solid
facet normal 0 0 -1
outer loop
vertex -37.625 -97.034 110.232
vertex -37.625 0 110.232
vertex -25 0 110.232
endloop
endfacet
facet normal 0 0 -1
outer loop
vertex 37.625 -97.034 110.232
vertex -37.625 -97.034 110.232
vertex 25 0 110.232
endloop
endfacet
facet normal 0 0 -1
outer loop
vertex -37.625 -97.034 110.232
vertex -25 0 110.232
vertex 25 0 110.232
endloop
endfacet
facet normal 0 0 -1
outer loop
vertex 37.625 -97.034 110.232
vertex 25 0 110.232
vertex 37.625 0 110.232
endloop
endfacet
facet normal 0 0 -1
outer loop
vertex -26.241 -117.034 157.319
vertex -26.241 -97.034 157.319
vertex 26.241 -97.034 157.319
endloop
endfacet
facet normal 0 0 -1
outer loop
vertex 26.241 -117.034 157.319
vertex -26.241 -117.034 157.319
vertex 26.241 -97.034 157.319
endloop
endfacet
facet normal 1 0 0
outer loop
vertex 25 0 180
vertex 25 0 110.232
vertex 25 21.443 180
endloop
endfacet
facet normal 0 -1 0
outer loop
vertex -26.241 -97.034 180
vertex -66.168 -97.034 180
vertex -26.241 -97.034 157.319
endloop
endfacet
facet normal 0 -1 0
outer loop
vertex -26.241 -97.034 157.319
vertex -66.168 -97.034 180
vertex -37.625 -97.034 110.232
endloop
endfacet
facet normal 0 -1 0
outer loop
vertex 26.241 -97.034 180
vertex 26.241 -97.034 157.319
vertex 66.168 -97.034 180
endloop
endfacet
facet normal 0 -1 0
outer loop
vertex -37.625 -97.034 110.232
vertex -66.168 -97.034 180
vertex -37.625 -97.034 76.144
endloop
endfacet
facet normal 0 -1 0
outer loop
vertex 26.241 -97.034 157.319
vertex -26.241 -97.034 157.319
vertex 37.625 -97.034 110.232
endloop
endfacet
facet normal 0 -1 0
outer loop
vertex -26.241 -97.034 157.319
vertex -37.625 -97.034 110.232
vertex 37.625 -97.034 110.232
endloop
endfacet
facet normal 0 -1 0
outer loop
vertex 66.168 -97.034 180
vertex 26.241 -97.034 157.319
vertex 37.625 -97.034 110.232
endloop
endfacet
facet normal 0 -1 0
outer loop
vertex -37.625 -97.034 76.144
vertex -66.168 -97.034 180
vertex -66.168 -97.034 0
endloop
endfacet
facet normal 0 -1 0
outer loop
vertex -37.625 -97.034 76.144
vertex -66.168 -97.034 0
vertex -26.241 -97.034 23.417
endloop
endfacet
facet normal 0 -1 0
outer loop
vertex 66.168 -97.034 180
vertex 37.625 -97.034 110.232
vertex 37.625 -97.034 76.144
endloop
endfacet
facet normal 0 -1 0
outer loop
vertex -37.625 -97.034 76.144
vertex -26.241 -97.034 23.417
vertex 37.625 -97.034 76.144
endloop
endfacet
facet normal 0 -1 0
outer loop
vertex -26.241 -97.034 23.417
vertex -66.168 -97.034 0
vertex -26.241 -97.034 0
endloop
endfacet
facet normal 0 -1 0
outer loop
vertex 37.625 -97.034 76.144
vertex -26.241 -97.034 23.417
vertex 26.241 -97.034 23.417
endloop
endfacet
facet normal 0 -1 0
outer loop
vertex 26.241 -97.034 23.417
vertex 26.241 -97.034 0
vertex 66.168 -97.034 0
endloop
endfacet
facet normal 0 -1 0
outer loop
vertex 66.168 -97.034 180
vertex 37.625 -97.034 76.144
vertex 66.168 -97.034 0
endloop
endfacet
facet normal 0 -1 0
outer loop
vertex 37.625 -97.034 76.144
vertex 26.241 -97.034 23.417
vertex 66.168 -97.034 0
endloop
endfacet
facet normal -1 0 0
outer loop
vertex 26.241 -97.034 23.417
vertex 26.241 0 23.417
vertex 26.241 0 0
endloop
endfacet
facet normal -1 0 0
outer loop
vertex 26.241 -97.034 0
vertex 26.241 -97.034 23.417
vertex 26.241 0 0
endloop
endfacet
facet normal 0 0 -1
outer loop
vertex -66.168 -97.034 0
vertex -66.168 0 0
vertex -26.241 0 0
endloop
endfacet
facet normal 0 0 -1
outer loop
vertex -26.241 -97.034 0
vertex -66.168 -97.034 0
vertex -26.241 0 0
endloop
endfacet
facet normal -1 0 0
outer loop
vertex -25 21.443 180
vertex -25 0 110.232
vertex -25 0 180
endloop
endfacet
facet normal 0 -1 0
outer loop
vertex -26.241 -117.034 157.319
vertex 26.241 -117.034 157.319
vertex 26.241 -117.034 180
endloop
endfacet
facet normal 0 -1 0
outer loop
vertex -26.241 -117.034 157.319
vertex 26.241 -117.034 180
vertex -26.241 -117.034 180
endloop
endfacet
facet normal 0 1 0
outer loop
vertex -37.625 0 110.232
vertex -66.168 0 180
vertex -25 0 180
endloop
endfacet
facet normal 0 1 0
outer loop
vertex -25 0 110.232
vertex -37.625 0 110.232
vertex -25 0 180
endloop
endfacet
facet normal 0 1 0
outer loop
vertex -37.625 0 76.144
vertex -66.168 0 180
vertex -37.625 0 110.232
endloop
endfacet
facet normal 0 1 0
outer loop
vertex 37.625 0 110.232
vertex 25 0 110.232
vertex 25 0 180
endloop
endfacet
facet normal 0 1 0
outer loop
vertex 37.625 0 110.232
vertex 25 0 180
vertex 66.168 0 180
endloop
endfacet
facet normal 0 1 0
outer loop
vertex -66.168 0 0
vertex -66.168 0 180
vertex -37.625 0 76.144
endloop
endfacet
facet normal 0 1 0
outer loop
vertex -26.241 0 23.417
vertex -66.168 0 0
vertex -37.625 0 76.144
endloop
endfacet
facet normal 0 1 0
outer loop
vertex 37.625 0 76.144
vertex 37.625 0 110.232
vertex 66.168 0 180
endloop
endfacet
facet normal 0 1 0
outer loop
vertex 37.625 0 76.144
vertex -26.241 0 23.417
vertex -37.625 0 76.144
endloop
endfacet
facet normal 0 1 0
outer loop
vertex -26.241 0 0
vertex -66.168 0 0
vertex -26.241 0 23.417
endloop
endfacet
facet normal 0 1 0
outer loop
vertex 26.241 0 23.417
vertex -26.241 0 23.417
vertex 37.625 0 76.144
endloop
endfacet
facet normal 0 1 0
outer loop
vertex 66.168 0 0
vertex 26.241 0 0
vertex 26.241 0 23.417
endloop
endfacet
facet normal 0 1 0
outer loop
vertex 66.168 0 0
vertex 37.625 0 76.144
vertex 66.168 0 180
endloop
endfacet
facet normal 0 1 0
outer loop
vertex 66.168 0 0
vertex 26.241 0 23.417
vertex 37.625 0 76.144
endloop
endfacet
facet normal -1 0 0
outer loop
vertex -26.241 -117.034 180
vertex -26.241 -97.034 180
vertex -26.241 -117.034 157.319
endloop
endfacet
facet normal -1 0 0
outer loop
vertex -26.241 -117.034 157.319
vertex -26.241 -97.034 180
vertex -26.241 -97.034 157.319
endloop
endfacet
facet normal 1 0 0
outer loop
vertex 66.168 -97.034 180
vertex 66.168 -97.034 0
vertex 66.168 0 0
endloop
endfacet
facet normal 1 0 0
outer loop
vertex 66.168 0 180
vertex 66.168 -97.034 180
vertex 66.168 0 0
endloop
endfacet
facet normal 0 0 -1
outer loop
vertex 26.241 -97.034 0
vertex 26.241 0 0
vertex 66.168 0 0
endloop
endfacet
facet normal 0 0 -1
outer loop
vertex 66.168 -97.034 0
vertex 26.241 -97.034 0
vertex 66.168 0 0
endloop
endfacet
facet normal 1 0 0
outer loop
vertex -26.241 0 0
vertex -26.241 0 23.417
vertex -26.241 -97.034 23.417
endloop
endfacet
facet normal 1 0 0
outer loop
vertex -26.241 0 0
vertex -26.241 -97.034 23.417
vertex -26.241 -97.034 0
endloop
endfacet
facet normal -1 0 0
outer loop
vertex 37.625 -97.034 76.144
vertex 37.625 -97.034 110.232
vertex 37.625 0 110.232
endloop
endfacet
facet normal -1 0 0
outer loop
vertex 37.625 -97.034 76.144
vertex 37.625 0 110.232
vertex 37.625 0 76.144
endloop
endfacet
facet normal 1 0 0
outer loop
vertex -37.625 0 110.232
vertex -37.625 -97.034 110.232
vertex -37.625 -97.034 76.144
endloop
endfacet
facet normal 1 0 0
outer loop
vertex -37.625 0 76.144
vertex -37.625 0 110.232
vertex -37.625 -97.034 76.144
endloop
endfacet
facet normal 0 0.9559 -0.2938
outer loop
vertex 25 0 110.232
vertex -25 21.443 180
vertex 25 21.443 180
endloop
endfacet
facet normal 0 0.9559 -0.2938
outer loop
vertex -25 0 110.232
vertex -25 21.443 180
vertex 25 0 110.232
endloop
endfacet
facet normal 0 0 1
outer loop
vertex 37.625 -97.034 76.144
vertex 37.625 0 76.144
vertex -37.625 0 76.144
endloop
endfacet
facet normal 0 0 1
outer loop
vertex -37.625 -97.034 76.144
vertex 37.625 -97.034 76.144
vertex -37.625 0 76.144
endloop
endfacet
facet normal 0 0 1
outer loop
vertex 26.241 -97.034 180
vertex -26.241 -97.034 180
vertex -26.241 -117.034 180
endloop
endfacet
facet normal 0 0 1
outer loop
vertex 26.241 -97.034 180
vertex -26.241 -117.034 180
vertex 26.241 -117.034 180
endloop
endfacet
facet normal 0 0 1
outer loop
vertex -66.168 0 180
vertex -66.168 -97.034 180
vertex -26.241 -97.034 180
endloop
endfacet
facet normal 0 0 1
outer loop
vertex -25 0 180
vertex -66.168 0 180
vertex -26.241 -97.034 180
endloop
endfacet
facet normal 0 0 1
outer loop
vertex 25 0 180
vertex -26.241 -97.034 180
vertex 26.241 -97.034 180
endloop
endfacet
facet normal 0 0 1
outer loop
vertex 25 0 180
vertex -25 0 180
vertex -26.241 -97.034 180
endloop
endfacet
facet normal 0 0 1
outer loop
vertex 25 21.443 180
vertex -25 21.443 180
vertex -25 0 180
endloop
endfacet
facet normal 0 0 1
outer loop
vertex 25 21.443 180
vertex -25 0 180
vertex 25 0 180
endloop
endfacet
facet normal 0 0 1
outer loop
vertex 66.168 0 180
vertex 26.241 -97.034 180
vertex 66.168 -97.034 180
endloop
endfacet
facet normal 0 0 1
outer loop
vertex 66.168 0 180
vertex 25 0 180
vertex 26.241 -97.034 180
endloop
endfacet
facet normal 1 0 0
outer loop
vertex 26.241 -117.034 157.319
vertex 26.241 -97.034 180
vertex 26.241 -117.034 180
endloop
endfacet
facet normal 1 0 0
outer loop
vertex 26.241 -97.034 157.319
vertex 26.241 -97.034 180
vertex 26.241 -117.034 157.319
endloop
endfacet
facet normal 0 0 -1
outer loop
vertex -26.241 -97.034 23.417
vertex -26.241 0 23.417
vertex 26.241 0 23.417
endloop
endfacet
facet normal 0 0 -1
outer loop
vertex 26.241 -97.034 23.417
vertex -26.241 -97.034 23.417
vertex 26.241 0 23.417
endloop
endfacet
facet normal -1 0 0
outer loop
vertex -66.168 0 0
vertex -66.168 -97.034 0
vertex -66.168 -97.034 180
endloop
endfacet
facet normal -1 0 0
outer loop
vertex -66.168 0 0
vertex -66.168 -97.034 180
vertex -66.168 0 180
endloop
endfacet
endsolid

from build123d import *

# Parameters (mm, degrees)
SKETCH_1_W           = 132.33692867
SKETCH_1_H           = 97.034055892
EXTRUDE_1_DEPTH      = 180
SKETCH_2_W           = 37.625025254
SKETCH_2_H           = 34.08860124
SKETCH_2_W_2         = 26.240865703
SKETCH_2_H_2         = 23.4168688
CUT_EXTRUDE_2_DEPTH  = 215.927601009
SKETCH_6_W           = 26.240865703
SKETCH_6_H           = 22.681143593
EXTRUDE_2_DEPTH      = 20
EXTRUDE_3_DEPTH      = 25
EXTRUDE_3_DEPTH_BACK = 25


with BuildPart() as part:
    # Эскиз1 → Бобышка-Вытянуть1 (new body)
    with BuildSketch(Plane.XY):
        with Locations((0, -48.517027946)):
            Rectangle(SKETCH_1_W, SKETCH_1_H)
    extrude(amount=EXTRUDE_1_DEPTH)

    # Эскиз2 → Вырез-Вытянуть2 (cut, through all)
    with BuildSketch(Plane(origin=(0, 0, 0), x_dir=(1, 0, 0), z_dir=(0, 1, 0))):
        with Locations((-18.812512627, -93.188142562)):
            Rectangle(SKETCH_2_W, SKETCH_2_H)
        with Locations((18.812512627, -93.188142562)):
            Rectangle(SKETCH_2_W, SKETCH_2_H)
        with Locations((13.120432852, -11.7084344)):
            Rectangle(SKETCH_2_W_2, SKETCH_2_H_2)
        with Locations((-13.120432852, -11.7084344)):
            Rectangle(SKETCH_2_W_2, SKETCH_2_H_2)
    extrude(amount=-CUT_EXTRUDE_2_DEPTH, mode=Mode.SUBTRACT)

    # Эскиз6 → Бобышка-Вытянуть2 (add)
    with BuildSketch(Plane(origin=(0, -97.034055892, 0), x_dir=(-1, 0, 0), z_dir=(0, -1, 0))):
        with Locations((13.120432852, -168.659428203)):
            Rectangle(SKETCH_6_W, SKETCH_6_H)
        with Locations((-13.120432852, -168.659428203)):
            Rectangle(SKETCH_6_W, SKETCH_6_H)
    extrude(amount=EXTRUDE_2_DEPTH)

    # Эскиз8 → Бобышка-Вытянуть3 (add, two sides: drawn at the far end of the back side and taken through both)
    with BuildSketch(Plane(origin=(0, 0, 0), x_dir=(0, 0, -1), z_dir=(1, 0, 0)).offset(-EXTRUDE_3_DEPTH_BACK)):
        Polygon((-180, 0), (-180, 21.442823519), (-110.232443182, 0), align=None)
    extrude(amount=EXTRUDE_3_DEPTH + EXTRUDE_3_DEPTH_BACK)


solid = part.part
